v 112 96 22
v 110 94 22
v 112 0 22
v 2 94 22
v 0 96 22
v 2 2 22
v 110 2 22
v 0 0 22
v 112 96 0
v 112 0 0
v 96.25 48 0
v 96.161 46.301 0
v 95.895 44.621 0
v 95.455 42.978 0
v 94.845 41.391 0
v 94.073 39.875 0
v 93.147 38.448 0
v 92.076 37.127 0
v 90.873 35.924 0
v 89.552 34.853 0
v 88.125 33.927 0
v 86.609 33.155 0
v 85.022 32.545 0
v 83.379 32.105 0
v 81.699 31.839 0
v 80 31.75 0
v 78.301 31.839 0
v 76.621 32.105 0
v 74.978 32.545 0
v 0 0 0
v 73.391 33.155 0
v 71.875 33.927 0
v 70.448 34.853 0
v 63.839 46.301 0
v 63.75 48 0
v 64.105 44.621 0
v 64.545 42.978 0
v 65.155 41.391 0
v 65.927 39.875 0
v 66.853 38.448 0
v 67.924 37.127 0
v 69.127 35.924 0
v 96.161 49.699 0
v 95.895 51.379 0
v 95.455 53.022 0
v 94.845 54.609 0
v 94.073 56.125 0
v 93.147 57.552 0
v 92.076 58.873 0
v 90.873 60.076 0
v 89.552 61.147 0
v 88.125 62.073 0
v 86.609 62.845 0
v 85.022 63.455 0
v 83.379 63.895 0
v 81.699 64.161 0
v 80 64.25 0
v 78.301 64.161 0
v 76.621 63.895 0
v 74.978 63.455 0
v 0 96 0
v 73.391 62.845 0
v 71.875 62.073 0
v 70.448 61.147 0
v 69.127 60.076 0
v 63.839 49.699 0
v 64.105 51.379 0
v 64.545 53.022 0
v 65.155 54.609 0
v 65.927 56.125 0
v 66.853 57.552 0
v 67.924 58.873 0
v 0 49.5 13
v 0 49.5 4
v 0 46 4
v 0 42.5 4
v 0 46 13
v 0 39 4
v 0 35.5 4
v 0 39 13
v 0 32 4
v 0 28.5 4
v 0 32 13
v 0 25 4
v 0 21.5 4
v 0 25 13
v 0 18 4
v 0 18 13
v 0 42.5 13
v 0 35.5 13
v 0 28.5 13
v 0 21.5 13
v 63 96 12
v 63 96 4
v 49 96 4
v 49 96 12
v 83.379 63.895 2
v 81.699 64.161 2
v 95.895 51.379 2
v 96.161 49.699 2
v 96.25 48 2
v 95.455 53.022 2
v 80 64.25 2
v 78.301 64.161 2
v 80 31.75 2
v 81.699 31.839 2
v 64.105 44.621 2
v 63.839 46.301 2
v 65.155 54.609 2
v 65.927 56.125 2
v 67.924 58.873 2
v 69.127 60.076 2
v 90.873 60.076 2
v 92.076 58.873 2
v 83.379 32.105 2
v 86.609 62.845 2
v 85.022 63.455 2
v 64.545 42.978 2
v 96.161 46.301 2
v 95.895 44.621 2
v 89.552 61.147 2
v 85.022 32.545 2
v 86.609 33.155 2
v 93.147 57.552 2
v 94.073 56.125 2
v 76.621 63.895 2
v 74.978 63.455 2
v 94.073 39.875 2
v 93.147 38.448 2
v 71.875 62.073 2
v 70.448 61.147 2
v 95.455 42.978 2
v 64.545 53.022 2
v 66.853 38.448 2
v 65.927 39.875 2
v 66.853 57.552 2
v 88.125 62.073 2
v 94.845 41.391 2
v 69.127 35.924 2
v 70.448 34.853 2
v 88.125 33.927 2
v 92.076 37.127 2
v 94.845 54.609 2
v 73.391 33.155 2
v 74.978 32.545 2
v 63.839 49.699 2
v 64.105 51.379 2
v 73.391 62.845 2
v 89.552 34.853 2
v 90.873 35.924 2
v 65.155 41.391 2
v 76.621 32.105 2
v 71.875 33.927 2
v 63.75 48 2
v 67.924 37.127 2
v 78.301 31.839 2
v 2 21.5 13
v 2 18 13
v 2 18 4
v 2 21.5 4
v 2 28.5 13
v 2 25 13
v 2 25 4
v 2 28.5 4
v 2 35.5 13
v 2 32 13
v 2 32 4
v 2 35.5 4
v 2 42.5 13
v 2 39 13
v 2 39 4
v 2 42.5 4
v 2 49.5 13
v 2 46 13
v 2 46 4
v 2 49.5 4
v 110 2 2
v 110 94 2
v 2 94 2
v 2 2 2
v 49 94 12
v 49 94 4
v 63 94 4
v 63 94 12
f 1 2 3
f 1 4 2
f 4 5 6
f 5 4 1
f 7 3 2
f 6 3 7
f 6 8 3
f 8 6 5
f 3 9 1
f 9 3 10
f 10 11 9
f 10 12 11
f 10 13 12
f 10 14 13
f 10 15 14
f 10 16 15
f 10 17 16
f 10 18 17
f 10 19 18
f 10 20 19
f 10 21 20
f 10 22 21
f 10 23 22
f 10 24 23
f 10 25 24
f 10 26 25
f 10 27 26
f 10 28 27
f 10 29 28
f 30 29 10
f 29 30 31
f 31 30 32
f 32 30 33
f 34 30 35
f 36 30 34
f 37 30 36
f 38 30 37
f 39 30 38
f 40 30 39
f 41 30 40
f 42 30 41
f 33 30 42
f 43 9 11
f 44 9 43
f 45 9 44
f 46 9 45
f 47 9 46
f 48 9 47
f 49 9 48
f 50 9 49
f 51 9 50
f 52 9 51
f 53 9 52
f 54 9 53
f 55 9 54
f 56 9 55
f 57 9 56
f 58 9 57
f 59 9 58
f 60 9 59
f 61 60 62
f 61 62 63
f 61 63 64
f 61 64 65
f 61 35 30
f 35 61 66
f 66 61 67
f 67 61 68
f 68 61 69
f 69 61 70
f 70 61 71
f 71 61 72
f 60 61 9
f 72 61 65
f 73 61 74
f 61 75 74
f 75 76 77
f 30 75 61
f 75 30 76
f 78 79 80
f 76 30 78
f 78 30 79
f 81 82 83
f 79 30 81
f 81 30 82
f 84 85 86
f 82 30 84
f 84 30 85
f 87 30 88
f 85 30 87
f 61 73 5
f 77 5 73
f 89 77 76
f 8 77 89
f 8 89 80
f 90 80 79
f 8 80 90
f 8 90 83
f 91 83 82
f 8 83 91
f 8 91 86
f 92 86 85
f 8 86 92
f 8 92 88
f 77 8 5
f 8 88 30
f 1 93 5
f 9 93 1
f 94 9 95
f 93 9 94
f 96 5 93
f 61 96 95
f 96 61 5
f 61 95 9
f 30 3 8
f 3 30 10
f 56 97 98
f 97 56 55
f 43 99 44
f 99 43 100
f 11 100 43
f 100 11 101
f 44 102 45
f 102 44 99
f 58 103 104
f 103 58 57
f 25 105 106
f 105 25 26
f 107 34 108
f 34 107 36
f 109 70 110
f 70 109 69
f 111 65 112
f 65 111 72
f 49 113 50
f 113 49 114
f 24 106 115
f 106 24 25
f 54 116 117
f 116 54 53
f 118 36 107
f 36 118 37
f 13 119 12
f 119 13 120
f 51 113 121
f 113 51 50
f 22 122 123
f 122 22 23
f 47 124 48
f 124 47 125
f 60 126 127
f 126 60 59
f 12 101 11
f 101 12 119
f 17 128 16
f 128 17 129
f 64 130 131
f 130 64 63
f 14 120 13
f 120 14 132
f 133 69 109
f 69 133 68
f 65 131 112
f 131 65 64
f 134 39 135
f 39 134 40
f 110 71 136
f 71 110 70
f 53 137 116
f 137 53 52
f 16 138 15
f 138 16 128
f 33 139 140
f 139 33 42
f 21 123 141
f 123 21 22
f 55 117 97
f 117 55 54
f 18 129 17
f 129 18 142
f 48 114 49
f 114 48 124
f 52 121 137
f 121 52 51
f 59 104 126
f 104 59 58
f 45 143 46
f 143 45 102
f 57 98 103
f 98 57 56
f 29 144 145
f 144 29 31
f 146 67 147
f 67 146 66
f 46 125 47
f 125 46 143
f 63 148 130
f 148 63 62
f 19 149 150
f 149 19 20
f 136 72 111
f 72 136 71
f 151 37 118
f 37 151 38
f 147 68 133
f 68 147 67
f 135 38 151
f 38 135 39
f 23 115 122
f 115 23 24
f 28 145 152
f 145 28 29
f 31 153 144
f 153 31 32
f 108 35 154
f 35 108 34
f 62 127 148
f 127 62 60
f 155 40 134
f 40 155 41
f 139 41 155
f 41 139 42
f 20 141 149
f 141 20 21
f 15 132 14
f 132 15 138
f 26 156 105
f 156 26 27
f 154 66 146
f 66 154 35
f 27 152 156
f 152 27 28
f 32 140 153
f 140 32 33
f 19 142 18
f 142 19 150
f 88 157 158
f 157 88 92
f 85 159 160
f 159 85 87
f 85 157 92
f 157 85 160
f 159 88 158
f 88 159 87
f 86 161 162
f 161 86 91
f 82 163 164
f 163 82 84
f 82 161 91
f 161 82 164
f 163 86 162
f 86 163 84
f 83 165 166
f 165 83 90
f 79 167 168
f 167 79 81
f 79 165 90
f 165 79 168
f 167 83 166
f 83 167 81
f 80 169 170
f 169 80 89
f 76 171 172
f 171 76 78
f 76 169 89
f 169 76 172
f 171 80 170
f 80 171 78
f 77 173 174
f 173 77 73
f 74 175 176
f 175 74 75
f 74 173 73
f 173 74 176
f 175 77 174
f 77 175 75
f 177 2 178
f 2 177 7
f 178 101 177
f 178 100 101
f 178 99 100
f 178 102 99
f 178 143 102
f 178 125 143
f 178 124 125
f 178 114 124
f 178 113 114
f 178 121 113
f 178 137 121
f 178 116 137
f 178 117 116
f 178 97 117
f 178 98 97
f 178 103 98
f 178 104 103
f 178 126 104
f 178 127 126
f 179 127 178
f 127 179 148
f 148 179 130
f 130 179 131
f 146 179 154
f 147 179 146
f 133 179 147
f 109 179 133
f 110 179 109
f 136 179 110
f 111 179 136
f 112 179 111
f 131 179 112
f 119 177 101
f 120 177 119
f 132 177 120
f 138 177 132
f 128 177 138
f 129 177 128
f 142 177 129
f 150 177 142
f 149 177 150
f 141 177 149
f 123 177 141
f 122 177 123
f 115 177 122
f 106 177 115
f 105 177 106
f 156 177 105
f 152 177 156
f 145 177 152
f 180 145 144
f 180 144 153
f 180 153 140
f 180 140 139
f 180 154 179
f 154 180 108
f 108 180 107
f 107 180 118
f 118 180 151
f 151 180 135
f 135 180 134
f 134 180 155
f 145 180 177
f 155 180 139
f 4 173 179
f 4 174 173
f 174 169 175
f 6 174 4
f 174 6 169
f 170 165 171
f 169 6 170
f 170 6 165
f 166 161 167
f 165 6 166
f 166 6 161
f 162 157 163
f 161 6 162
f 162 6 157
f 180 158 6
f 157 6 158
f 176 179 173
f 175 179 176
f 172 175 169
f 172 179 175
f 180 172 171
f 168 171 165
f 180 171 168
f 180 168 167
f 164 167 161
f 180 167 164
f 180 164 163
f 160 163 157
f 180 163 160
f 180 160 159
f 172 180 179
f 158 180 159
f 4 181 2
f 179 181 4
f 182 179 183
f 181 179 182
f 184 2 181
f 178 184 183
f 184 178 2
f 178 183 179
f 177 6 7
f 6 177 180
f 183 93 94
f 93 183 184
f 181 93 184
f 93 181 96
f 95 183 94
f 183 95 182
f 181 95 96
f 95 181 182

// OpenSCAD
// =============================================================================
// Wake 睡眠环境守夜盒 · 45° 床头黄金斜切外壳 (Bambu Lab 拓竹 3D 打印专用)
// 设计者: 刘航成 & 夏工 & Antigravity
// 适用机型: 拓竹 Bambu Lab P1S / A1 / X1C / A1 mini
// 耗材建议: PETG (官方赞助耗材) 或 PLA
// =============================================================================

// -------- 全局参数配置 (单位: mm) --------
$fn = 60; // 圆弧精细度

// 整体外框尺寸
box_w = 112;      // 宽度 (左右)
box_d = 96;       // 深度 (前后)
box_h_rear = 68;   // 后侧最高处
box_h_front = 18;  // 前端最低高度
wall = 2.0;       // 壳体壁厚 (拓竹 0.4 喷嘴恰好 5 道整墙，强度最高)
tolerance = 0.25; // 配合公差

// 主板参数 (ESP32-S3 Korvo 2 V3)
board_w = 82;
board_d = 56;
board_h = 12;

// 屏幕视窗 (ST7789 1.69寸)
screen_w = 30.5;
screen_h = 37.0;

// 传感器开孔参数
pir_diameter = 12.5;     // AM412 PIR 人体红外菲涅尔透镜直径
bh1750_diameter = 5.0;   // BH1750 光敏采光孔
mic_diameter = 2.0;      // 板载双麦克风拾音孔
ws2812_ring_od = 32.5;   // WS2812 8位灯环外径
ws2812_ring_id = 17.5;   // WS2812 8位灯环内径

// 面包板收纳槽 (以 SYB-170 迷你面包板为基准，兼顾 400孔兼容)
breadboard_w = 47.0;
breadboard_d = 36.5;
breadboard_h = 10.0;

// 视图控制: 0=完整装配预览, 1=仅打印下壳底座, 2=仅打印上壳面板
part = 0; 

if (part == 0) {
    color("LightGray", 0.9) bottom_case();
    translate([0, 0, 0]) color("CornflowerBlue", 0.85) top_case();
} else if (part == 1) {
    // 下壳摆盘姿态: 底面平贴热床
    bottom_case();
} else if (part == 2) {
    // 上壳摆盘姿态: 旋转使大斜面或顶部平面平贴热床，100% 免支撑
    rotate([45, 0, 0]) top_case();
}

// =============================================================================
// 下壳底座 (Bottom Base): 容纳面包板、杜邦线、底部地脚柔光灯环、SPA06通风仓
// =============================================================================
module bottom_case() {
    difference() {
        union() {
            // 主底座外壳
            cube([box_w, box_d, box_h_front + 4]);
            
            // 配合子母阶梯台阶 (与上盖对接)
            translate([wall + tolerance, wall + tolerance, box_h_front + 4])
                difference() {
                    cube([box_w - 2*(wall + tolerance), box_d - 2*(wall + tolerance), 3.5]);
                    translate([wall, wall, -0.1])
                        cube([box_w - 2*(wall + tolerance) - 2*wall, box_d - 2*(wall + tolerance) - 2*wall, 4]);
                }
            
            // 面包板限位卡槽框架 (免螺丝压装)
            translate([10, 10, wall])
                difference() {
                    cube([breadboard_w + 3, breadboard_d + 3, 4]);
                    translate([1.5, 1.5, 0])
                        cube([breadboard_w, breadboard_d, 5]);
                }
                
            // 四角螺丝固定柱 (M3 自攻 / 压配)
            screw_post(wall + 4, wall + 4, box_h_front);
            screw_post(box_w - wall - 8, wall + 4, box_h_front);
            screw_post(wall + 4, box_d - wall - 8, box_h_front);
            screw_post(box_w - wall - 8, box_d - wall - 8, box_h_front);
        }
        
        // 掏空内部空间 (容纳面包板与杜邦线弯折高裕度)
        translate([wall, wall, wall])
            cube([box_w - 2*wall, box_d - 2*wall, box_h_front + 10]);
            
        // 底部内凹地脚柔光环槽 (WS2812 8颗灯环朝桌面漫反射)
        translate([box_w - 32, box_d / 2, -0.1]) {
            cylinder(d = ws2812_ring_od, h = wall + 0.2);
            // 中心出线孔
            cylinder(d = ws2812_ring_id - 2, h = 6);
        }
        
        // 侧后方 Type-C 供电开孔
        translate([box_w / 2 - 7, box_d - wall - 1, wall + 2])
            cube([14, wall + 2, 8]);
            
        // 侧面进风百叶窗 (SPA06 气压温度传感器对流通风，杜绝芯片发热影响)
        for (i = [0:4]) {
            translate([-0.1, 18 + i*7, wall + 2])
                cube([wall + 0.2, 3.5, 9]);
        }
    }
}

// 螺丝柱辅助模块
module screw_post(x, y, h) {
    translate([x, y, wall])
        difference() {
            cylinder(d = 7, h = h - wall);
            translate([0, 0, 1])
                cylinder(d = 2.6, h = h); // M3 自攻螺丝预制孔
        }
}

// =============================================================================
// 上壳前面板 (Top Bezel): 45° 黄金斜面，嵌入屏幕、PIR、光敏、麦克风
// =============================================================================
module top_case() {
    difference() {
        // 外轮廓放样斜面体
        polyhedron(
            points = [
                // 底面 4 点
                [0, 0, box_h_front + 4],             // 0: 前左
                [box_w, 0, box_h_front + 4],         // 1: 前右
                [box_w, box_d, box_h_front + 4],     // 2: 后右
                [0, box_d, box_h_front + 4],         // 3: 后左
                // 顶斜面 4 点 (后高前低，自然形成 45° 黄金倾角)
                [0, 0, box_h_front + 4],             // 4: 汇聚于前沿
                [box_w, 0, box_h_front + 4],         // 5: 汇聚于前沿
                [box_w, box_d - 12, box_h_rear],     // 6: 顶后右
                [0, box_d - 12, box_h_rear],         // 7: 顶后左
                [box_w, box_d, box_h_rear],          // 8: 顶平段后右
                [0, box_d, box_h_rear]               // 9: 顶平段后左
            ],
            faces = [
                [0, 1, 2, 3],       // 底
                [0, 4, 5, 1],       // 前
                [4, 5, 6, 7],       // 主 45° 斜面板
                [7, 6, 8, 9],       // 顶小平台
                [3, 2, 8, 9],       // 后壁
                [0, 3, 9, 7, 4],    // 左壁
                [1, 5, 6, 8, 2]     // 右壁
            ]
        );
        
        // 内部掏空
        translate([wall, wall, box_h_front + 2])
            cube([box_w - 2*wall, box_d - 2*wall, box_h_rear]);

        // 1. ST7789 1.69寸彩屏视窗 (居中偏上开孔)
        translate([box_w / 2 - screen_w / 2, 28, box_h_front + 15])
            rotate([-35, 0, 0])
                cube([screen_w, screen_h, 25]);
                
        // 2. AM412 PIR 人体红外圆球视窗 (屏幕右上方，微俯角俯视床沿起夜动线)
        translate([box_w / 2 + screen_w / 2 + 12, 42, box_h_front + 28])
            rotate([-35, 0, 0])
                cylinder(d = pir_diameter, h = 30);
                
        // 3. BH1750 环境光照采集孔 (顶部斜上方，全向接收室内漫反射光)
        translate([box_w / 2 - screen_w / 2 - 12, 54, box_h_front + 36])
            rotate([-35, 0, 0])
                cylinder(d = bh1750_diameter, h = 30);
                
        // 4. 板载 ES7210 双麦克风拾音微孔 (前面板下方对称分布)
        translate([box_w / 2 - 18, 16, box_h_front + 5])
            cylinder(d = mic_diameter, h = 15);
        translate([box_w / 2 + 18, 16, box_h_front + 5])
            cylinder(d = mic_diameter, h = 15);

        // 5. 后侧出气通风散热格栅
        for (j = [0:5]) {
            translate([15 + j*14, box_d - wall - 1, box_h_rear - 18])
                cube([7, wall + 2, 10]);
        }
    }
}
